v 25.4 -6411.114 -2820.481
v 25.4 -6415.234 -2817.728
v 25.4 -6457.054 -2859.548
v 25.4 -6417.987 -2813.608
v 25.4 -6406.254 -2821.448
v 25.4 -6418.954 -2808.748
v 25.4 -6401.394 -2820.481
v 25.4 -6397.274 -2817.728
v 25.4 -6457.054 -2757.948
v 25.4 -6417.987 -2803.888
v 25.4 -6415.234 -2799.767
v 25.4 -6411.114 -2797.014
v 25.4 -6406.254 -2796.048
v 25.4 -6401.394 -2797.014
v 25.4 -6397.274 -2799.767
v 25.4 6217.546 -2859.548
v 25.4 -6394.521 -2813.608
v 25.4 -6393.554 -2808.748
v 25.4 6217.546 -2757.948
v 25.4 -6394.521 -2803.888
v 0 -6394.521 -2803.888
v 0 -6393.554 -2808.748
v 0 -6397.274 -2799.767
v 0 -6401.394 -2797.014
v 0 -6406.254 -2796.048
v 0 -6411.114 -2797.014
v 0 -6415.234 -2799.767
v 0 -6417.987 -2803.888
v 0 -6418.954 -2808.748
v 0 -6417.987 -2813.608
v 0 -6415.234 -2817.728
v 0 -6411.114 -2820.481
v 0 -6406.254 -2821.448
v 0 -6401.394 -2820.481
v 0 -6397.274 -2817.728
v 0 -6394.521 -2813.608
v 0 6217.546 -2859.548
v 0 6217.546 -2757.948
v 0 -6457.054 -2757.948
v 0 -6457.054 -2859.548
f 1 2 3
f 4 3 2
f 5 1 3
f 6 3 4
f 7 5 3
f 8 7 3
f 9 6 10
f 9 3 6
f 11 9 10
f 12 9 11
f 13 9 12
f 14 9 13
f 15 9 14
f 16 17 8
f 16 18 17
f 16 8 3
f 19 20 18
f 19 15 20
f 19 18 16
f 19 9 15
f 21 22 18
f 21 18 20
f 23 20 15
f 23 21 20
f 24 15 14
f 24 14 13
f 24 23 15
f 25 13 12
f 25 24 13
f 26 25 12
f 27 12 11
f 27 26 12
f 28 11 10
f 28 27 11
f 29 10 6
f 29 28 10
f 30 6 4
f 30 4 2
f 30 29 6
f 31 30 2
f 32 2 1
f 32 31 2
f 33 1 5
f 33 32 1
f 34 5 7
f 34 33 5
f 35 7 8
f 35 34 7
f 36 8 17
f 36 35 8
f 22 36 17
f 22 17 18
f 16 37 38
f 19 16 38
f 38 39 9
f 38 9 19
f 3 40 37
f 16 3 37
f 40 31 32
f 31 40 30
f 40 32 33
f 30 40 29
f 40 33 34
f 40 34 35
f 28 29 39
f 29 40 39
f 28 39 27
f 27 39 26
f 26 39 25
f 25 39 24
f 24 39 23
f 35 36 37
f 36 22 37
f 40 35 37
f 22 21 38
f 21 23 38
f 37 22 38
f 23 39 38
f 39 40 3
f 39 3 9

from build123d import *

# Parameters (mm, degrees)
F0_W     = 12750
F0_H     = 101.6
F1_DEPTH = 25.4
F3_W     = 12674.6
F3_H     = 101.6
F3_R     = 12.7
F4_DEPTH = 25.4
F5_DEPTH = 25.4


with BuildPart() as f1:
    # F0 (on Front) → F1 (new body)
    with BuildSketch(Plane.XZ):
        with Locations((6166.7917860505, -1.2713777833)):
            Rectangle(F0_W, F0_H)
    extrude(amount=F1_DEPTH)


with BuildPart() as f4:
    # F3 (on Right) → F4 (new body)
    with BuildSketch(Plane.YZ):
        with Locations((-119.7538606495, -2808.7475822979)):
            Rectangle(F3_W, F3_H)
        with Locations((-6406.2538606495, -2808.7475822979)):
            Circle(F3_R, mode=Mode.SUBTRACT)
    extrude(amount=F4_DEPTH)

    # F3 (on Right) → F5 (join)
    with BuildSketch(Plane.YZ):
        with Locations((-119.7538606495, -2808.7475822979)):
            Rectangle(F3_W, F3_H)
        with Locations((-6406.2538606495, -2808.7475822979)):
            Circle(F3_R, mode=Mode.SUBTRACT)
    extrude(amount=F5_DEPTH)


solid = f4.part
